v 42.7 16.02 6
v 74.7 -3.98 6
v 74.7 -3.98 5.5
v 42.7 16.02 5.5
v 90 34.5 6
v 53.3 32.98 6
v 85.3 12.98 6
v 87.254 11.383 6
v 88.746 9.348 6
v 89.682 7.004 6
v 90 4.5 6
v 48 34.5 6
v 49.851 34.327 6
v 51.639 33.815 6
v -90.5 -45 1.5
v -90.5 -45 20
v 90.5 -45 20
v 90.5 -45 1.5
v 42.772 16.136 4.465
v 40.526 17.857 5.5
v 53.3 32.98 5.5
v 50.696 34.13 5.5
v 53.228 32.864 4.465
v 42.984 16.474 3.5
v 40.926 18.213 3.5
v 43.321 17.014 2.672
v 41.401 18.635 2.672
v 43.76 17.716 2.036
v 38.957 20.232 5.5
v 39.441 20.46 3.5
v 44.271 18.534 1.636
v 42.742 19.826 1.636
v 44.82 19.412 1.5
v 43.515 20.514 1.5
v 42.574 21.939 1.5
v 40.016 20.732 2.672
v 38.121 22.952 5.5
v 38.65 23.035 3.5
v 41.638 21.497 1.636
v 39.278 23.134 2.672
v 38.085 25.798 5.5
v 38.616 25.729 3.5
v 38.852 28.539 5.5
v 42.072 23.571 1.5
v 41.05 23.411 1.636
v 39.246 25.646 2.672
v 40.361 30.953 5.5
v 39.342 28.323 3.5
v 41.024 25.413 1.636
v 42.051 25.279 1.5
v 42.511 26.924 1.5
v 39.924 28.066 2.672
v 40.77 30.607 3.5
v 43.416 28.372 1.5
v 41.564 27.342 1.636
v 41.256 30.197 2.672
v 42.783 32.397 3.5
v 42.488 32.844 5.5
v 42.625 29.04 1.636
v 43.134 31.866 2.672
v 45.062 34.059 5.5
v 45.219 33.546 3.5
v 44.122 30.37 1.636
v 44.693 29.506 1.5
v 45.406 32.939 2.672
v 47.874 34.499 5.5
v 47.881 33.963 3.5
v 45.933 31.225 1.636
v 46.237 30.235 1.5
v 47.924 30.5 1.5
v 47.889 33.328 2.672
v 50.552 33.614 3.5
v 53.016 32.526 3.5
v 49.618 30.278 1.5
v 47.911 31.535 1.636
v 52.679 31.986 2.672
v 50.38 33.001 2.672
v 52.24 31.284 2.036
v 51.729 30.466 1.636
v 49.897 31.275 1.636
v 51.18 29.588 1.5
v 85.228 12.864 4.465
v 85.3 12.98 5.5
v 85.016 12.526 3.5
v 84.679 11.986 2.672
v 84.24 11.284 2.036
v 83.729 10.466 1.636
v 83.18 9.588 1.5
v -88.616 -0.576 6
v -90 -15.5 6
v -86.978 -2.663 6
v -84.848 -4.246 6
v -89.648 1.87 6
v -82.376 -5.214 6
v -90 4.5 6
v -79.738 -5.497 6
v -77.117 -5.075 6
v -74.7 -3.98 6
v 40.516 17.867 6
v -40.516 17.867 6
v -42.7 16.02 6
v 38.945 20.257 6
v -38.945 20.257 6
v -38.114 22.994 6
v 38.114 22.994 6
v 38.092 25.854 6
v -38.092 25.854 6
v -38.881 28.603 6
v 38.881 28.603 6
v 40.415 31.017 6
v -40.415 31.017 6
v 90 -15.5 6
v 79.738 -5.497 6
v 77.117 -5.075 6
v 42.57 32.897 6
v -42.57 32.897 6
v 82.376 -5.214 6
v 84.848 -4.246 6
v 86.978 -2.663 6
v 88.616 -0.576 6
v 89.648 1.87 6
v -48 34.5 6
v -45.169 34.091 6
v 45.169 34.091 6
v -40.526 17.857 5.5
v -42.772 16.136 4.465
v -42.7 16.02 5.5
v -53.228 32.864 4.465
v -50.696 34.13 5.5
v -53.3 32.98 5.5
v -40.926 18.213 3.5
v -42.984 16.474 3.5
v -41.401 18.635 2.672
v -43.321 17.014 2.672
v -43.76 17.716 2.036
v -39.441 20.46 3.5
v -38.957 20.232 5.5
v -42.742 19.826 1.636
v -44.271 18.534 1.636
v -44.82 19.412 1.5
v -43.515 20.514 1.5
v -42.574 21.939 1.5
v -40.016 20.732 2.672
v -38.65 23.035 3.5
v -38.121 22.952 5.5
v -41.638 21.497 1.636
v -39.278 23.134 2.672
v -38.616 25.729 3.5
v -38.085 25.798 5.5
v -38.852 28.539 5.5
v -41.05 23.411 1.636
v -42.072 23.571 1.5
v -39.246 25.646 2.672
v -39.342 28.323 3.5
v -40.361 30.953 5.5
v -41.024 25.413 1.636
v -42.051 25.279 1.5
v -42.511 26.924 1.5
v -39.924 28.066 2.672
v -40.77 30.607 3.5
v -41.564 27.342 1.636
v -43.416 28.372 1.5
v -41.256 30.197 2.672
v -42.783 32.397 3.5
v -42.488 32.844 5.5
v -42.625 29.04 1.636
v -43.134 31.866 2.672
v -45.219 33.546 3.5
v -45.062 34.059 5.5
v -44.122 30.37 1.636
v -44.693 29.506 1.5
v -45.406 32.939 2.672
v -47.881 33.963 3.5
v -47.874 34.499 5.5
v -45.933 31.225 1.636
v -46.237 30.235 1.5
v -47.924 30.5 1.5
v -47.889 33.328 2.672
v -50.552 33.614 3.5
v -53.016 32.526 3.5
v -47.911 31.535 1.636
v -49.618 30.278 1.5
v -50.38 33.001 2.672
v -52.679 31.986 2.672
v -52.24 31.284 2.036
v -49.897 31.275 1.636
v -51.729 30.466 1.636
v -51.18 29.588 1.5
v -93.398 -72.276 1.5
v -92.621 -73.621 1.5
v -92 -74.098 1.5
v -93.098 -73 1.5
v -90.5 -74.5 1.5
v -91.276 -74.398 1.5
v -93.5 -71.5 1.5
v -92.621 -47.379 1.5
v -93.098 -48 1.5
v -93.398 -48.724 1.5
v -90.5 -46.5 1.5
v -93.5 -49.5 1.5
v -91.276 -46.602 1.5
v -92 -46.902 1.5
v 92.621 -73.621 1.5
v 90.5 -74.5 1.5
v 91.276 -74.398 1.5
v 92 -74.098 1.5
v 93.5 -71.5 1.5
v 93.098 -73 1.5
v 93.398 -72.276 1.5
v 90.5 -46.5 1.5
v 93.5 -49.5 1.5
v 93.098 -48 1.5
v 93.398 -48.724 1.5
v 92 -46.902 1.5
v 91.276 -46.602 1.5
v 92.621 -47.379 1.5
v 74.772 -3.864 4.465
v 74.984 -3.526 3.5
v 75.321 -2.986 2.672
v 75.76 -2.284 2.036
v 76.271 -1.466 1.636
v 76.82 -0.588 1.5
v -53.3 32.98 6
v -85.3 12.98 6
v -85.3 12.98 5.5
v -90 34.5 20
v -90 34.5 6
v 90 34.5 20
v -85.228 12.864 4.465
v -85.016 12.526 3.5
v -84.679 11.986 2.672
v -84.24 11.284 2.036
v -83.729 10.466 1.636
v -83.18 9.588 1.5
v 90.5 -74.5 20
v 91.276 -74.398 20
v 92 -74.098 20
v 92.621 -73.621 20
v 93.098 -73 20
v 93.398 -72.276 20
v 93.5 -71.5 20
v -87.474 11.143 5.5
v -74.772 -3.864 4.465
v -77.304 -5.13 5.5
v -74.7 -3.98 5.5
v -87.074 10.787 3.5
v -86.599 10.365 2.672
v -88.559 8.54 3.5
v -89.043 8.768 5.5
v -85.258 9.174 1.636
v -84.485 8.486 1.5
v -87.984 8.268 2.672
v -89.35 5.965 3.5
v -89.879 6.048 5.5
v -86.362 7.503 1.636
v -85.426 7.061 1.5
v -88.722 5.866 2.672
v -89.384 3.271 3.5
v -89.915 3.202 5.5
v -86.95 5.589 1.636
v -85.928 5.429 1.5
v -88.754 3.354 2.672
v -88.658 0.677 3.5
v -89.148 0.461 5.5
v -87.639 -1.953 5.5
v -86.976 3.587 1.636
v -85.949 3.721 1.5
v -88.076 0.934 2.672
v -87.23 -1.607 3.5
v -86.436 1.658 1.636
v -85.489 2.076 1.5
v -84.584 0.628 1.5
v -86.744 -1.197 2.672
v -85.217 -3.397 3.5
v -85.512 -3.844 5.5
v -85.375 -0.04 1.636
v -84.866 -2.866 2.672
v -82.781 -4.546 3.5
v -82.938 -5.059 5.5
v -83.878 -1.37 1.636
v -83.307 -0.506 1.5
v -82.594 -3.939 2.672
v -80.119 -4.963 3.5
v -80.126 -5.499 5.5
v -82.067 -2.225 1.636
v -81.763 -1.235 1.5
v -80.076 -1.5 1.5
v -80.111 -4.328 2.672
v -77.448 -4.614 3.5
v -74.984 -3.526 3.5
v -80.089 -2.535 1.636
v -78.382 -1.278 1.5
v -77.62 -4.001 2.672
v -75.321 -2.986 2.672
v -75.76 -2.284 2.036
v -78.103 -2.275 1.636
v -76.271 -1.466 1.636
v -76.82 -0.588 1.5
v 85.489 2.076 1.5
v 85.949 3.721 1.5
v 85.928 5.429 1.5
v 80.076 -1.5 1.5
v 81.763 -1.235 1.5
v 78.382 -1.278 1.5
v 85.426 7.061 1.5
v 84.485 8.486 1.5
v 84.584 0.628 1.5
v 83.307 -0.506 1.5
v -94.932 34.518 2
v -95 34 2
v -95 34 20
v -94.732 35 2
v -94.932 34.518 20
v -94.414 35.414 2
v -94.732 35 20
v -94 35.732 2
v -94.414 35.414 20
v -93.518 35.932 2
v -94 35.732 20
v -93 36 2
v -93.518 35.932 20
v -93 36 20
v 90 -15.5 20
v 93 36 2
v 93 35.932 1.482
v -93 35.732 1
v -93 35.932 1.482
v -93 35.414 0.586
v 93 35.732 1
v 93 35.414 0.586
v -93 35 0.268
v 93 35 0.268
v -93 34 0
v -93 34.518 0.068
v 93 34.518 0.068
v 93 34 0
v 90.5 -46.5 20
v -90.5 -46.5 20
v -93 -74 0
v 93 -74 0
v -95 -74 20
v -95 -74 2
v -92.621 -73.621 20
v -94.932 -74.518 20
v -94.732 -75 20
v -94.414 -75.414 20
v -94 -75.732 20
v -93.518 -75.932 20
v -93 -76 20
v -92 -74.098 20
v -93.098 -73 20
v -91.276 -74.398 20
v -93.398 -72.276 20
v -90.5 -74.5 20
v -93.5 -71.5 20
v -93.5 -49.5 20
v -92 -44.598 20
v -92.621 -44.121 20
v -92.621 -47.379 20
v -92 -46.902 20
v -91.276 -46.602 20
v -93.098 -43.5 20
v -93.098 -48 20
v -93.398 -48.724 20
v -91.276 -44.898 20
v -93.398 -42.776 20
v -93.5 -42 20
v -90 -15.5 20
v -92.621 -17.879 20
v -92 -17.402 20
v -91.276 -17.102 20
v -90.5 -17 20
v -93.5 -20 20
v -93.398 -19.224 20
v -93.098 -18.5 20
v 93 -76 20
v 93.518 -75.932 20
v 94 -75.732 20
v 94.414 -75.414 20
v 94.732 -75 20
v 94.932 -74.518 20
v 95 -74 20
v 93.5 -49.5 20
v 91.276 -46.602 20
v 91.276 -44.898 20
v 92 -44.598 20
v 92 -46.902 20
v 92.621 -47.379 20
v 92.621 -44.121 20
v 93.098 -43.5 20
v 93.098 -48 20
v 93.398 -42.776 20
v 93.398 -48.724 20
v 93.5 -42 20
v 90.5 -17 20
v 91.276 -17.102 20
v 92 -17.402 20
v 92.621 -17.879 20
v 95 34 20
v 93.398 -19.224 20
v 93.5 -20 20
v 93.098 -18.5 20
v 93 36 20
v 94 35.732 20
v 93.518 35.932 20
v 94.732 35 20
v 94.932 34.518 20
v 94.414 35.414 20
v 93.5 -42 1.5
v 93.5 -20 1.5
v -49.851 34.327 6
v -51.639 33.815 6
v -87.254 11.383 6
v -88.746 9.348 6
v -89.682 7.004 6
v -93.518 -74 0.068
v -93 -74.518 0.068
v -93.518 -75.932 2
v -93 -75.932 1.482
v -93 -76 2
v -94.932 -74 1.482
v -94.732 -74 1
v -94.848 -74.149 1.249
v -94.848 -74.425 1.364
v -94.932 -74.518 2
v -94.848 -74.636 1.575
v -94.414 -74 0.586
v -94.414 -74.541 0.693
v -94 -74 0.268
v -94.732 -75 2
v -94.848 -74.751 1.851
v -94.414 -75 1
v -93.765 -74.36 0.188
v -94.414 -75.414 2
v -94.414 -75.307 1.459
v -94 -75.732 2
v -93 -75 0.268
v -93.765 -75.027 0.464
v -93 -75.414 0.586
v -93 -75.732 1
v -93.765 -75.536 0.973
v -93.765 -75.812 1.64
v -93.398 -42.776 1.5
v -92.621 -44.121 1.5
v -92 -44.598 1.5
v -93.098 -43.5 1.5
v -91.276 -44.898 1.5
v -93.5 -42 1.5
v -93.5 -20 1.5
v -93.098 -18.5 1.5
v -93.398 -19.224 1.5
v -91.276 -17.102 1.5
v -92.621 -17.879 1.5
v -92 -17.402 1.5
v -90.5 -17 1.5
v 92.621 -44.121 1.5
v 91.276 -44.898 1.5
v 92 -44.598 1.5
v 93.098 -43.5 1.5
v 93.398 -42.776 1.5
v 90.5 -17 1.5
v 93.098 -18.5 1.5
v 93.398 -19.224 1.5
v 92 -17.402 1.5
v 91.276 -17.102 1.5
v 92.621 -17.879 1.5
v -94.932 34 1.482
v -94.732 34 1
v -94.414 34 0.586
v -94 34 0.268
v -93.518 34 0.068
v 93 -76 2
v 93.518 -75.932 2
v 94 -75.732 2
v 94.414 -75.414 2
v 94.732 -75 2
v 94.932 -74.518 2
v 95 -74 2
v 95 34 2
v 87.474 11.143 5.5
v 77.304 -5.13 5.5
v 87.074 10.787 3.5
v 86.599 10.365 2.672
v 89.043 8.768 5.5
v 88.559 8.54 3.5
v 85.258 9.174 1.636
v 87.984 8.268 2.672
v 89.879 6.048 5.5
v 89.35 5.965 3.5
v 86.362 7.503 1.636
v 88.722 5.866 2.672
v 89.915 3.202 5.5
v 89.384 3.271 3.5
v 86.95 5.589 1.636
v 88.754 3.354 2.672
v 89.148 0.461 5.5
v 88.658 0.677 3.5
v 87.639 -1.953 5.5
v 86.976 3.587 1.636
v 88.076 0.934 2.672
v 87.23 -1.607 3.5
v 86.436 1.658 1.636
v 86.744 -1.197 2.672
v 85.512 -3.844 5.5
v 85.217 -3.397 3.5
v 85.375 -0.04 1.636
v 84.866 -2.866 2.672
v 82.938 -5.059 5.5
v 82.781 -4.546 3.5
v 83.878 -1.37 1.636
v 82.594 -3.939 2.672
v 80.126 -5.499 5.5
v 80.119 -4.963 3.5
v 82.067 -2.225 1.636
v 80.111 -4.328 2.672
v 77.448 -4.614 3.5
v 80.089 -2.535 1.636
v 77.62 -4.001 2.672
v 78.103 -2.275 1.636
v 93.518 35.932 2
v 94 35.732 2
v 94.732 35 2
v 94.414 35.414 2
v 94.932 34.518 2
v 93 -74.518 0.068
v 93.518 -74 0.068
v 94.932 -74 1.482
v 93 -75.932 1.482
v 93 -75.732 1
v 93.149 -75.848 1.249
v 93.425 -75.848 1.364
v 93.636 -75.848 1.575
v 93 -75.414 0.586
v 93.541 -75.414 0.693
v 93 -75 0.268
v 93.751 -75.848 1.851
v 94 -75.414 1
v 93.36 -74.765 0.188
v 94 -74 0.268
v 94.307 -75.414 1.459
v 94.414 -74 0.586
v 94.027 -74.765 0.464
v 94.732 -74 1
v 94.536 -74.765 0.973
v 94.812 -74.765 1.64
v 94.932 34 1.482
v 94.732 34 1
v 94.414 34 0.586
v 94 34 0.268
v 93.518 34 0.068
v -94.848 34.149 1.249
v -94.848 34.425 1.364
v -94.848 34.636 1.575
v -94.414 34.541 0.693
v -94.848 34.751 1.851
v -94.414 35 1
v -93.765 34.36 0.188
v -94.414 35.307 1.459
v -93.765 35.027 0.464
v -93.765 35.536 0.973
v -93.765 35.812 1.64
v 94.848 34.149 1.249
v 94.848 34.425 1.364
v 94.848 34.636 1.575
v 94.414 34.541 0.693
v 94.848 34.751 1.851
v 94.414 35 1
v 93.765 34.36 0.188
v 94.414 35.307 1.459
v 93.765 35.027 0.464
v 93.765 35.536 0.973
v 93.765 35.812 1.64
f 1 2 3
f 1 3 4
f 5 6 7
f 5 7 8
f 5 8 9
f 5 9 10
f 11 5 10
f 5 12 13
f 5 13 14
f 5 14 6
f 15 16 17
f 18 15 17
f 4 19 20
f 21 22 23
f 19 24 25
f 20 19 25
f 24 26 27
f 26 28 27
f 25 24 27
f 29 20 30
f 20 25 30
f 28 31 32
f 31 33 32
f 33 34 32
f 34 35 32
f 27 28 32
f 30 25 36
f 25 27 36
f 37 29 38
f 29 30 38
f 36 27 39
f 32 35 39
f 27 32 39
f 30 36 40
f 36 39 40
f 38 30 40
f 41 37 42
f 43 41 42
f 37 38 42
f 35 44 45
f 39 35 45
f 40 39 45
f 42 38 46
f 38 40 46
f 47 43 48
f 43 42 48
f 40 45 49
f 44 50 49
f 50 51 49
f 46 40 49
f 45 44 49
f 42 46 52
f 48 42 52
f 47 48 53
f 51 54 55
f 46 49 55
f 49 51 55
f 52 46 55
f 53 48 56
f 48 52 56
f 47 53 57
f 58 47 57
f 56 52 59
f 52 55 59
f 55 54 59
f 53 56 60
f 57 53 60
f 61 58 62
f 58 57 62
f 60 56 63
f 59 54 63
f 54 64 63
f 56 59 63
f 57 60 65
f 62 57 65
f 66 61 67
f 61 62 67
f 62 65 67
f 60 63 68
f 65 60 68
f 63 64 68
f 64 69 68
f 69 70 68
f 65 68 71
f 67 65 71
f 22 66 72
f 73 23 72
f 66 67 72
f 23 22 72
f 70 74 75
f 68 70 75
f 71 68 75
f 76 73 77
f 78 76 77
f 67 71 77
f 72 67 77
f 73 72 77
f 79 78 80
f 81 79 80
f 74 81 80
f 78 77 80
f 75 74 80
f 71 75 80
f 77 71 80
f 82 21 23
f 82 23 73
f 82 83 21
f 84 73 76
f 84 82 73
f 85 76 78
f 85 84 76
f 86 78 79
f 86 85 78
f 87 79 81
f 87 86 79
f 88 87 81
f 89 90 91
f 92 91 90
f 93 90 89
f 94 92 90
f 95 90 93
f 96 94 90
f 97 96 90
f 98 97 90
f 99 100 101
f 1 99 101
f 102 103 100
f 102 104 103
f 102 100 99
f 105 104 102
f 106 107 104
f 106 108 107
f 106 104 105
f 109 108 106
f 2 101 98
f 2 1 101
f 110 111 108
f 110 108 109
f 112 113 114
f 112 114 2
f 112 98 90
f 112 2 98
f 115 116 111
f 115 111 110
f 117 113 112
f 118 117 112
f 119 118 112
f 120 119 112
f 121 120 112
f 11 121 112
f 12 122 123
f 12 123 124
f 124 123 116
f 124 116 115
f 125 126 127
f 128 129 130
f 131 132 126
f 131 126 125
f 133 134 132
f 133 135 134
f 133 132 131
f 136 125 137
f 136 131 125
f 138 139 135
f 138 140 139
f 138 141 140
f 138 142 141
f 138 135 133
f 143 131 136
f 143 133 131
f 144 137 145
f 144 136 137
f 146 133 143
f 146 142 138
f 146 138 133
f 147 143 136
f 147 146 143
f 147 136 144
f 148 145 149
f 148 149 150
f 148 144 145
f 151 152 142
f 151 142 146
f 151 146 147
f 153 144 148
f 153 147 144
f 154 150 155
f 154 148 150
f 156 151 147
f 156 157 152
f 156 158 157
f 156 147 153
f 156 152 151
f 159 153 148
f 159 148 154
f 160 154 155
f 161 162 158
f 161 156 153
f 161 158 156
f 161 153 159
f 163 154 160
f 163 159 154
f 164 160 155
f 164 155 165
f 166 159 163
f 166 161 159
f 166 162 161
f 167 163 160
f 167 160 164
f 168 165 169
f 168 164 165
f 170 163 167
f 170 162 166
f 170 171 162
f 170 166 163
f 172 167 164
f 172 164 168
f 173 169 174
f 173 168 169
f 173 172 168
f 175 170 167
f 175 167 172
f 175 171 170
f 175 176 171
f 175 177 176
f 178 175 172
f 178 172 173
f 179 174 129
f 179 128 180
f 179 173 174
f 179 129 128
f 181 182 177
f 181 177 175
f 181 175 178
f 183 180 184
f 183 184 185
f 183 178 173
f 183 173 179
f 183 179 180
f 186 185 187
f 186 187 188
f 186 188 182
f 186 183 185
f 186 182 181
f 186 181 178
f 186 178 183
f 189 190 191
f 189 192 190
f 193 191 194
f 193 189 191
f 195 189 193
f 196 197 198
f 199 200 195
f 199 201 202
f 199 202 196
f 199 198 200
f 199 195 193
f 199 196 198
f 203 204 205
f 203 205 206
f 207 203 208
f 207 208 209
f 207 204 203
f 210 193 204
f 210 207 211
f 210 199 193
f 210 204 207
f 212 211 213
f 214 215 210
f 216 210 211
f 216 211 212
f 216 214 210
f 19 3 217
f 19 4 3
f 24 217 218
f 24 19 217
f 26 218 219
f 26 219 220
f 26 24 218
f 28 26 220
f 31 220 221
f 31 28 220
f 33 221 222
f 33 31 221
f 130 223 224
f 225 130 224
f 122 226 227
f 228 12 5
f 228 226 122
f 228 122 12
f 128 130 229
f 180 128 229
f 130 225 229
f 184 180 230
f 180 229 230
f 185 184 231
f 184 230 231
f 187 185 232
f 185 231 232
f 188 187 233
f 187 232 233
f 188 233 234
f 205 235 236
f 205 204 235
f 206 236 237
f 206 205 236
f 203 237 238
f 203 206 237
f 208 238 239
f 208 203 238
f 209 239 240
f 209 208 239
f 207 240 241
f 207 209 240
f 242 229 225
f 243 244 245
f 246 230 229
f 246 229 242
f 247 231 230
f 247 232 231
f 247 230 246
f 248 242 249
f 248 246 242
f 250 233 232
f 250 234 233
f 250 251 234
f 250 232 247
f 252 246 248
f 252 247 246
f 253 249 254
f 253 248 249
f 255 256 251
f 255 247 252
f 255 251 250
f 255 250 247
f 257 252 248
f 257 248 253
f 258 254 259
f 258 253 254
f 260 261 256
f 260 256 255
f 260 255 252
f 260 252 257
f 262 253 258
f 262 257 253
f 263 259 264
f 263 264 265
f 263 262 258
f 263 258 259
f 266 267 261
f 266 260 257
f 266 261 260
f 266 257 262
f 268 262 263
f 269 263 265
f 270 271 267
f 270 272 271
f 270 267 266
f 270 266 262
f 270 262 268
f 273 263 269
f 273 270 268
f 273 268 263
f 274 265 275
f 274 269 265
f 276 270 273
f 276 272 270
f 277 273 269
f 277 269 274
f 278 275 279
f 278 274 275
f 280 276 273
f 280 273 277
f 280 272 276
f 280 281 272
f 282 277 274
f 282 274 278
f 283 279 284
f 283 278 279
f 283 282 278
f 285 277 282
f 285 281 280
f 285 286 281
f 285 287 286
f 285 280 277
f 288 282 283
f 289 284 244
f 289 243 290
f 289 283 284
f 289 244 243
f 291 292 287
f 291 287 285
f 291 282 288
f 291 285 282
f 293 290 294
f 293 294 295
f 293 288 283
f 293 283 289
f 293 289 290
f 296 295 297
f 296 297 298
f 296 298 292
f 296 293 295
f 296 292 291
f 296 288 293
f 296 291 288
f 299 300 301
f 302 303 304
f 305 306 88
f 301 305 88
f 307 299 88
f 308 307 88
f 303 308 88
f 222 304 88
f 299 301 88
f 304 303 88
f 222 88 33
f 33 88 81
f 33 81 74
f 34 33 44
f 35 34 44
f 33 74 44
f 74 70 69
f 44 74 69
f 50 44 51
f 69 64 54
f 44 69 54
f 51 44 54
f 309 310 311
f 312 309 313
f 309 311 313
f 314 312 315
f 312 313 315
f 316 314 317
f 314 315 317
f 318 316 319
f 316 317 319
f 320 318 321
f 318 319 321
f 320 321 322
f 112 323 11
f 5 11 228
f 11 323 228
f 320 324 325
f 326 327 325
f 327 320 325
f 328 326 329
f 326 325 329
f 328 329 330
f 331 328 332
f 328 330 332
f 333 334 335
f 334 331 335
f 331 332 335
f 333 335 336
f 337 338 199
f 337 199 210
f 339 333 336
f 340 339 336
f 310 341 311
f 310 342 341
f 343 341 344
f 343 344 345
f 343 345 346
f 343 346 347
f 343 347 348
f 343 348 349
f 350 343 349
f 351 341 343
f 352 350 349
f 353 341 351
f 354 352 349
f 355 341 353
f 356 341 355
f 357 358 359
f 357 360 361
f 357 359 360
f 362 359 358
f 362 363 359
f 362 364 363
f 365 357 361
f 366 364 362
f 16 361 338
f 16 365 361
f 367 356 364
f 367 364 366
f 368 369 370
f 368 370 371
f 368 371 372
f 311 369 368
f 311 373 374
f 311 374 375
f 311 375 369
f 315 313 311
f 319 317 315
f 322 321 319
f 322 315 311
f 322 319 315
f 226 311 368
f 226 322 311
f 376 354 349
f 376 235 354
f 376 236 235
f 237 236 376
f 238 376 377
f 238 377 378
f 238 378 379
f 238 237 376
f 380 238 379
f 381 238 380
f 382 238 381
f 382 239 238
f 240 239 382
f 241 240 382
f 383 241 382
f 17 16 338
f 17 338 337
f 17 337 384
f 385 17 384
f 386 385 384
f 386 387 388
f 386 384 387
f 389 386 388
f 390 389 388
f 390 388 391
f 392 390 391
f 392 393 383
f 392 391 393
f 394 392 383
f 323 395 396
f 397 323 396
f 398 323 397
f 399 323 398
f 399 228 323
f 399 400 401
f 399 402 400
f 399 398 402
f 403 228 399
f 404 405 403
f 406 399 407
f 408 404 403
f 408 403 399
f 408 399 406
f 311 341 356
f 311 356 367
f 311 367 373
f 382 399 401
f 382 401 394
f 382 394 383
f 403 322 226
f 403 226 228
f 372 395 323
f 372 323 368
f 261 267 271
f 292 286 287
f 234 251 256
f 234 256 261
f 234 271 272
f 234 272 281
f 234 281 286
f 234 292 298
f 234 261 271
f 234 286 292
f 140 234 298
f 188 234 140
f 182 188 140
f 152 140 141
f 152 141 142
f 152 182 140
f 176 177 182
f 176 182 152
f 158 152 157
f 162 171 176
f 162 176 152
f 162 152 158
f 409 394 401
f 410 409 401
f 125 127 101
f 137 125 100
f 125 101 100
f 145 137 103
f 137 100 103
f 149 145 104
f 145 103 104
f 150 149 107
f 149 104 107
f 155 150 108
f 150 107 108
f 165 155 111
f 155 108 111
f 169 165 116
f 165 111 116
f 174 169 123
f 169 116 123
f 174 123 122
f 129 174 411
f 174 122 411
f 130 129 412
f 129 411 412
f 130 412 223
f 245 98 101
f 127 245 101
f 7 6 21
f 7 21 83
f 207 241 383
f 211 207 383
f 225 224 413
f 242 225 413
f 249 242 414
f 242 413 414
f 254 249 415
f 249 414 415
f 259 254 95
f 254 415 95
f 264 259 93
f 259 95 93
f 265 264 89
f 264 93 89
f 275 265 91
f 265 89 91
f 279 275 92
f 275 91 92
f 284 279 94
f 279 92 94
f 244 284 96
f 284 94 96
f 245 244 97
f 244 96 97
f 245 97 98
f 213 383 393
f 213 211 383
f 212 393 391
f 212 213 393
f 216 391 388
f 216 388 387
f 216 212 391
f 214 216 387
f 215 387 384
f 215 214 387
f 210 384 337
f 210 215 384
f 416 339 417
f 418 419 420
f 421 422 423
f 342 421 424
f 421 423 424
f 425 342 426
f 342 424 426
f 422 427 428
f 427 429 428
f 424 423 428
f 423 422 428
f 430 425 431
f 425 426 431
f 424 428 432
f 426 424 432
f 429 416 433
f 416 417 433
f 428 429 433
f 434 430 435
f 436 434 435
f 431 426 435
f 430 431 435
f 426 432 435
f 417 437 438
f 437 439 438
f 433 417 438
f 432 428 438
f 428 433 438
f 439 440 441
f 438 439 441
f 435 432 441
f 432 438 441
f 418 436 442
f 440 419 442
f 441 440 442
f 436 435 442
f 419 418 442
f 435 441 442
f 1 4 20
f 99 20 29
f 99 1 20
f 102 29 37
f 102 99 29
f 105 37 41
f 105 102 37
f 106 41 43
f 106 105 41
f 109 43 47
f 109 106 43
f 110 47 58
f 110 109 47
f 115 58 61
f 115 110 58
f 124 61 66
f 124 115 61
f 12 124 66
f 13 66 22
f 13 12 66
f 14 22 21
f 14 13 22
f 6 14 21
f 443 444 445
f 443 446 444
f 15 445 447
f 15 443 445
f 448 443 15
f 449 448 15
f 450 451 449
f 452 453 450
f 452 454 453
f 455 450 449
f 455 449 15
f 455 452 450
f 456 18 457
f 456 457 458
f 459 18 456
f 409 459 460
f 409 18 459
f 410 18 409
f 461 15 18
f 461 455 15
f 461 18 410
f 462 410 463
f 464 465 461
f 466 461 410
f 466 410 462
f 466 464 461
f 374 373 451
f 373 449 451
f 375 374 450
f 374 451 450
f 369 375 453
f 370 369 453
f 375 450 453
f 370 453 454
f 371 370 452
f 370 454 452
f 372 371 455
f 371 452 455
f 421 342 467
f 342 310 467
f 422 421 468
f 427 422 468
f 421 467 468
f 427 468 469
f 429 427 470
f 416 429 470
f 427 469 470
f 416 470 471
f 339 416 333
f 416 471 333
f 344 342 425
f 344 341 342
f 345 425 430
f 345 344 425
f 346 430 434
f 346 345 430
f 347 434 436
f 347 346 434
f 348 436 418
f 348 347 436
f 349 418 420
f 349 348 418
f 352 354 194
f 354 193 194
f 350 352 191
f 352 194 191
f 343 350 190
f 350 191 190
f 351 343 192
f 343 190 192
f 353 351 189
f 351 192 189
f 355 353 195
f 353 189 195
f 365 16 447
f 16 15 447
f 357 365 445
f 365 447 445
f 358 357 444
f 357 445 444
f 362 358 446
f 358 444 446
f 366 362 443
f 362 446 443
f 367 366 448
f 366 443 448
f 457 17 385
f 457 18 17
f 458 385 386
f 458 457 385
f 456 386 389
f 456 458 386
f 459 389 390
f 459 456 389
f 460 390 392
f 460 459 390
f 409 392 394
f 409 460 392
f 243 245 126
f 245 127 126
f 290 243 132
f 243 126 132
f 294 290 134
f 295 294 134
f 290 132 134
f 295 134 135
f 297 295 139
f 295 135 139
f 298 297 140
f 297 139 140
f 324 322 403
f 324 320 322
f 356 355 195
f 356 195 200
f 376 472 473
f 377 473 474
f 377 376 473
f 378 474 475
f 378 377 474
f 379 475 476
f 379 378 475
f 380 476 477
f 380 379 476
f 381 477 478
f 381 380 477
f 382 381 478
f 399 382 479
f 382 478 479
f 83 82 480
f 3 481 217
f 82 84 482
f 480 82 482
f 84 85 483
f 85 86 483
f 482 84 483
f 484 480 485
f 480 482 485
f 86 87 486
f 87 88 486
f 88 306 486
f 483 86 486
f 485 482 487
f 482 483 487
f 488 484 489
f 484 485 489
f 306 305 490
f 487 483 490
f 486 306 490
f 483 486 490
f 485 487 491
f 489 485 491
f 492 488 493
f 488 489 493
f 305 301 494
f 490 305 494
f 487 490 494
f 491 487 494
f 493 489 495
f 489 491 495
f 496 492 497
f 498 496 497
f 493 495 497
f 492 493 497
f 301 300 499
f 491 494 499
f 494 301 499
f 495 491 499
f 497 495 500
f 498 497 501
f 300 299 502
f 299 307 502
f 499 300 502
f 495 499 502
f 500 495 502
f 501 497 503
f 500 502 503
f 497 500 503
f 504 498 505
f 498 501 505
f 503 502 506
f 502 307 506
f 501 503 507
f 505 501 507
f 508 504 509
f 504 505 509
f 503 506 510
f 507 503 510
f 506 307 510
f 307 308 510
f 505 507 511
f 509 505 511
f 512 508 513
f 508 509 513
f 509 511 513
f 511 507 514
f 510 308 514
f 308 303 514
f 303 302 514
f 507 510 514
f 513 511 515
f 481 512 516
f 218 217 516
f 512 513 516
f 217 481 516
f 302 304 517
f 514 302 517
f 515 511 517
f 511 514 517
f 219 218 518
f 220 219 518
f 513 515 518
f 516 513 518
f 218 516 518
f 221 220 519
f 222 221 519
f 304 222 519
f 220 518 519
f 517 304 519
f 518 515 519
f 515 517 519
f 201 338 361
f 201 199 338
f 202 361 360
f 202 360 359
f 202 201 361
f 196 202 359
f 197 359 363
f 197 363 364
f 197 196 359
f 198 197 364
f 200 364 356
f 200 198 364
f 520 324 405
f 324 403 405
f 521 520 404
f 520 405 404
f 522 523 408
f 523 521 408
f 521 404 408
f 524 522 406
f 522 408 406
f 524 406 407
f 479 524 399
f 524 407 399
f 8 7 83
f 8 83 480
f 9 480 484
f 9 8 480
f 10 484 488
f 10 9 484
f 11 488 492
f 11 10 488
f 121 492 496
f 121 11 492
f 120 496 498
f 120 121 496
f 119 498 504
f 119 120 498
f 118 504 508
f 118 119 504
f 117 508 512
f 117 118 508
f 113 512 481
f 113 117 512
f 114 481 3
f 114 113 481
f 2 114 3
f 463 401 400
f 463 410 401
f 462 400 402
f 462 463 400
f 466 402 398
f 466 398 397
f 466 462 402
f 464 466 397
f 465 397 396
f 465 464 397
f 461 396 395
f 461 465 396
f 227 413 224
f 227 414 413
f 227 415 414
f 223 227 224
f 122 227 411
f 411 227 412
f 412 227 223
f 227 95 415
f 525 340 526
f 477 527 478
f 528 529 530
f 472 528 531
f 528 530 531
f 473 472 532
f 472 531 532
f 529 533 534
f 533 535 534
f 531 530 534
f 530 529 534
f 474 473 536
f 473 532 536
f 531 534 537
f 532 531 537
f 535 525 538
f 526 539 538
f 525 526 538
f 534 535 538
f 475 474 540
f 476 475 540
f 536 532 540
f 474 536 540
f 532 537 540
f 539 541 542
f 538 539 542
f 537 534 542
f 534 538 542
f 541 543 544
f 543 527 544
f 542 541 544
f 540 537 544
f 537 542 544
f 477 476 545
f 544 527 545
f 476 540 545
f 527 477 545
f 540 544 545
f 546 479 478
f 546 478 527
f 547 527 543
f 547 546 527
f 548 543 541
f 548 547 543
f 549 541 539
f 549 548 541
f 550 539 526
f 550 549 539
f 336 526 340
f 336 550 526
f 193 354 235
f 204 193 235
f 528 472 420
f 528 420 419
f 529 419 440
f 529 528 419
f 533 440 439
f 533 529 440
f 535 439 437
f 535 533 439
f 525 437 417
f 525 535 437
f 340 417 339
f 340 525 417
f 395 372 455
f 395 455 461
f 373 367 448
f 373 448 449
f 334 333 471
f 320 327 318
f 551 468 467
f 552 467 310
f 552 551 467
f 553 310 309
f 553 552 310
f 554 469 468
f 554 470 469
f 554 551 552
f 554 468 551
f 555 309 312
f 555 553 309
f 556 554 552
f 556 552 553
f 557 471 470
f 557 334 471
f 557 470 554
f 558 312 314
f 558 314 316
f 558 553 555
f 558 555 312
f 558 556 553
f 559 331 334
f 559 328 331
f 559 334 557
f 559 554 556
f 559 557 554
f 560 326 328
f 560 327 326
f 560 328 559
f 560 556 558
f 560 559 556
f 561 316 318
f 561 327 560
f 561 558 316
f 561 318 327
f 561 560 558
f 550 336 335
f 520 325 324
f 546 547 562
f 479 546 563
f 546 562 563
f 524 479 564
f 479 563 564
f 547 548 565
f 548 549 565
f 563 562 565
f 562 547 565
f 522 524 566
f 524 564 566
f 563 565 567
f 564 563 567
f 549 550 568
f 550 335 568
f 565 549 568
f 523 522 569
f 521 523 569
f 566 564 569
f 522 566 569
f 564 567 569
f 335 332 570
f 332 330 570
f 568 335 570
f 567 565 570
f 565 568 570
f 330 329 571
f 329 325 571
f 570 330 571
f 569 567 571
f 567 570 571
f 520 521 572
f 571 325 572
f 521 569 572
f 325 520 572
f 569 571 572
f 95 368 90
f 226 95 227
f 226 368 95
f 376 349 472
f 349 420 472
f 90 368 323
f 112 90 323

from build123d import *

# Parameters (mm, degrees)
SKETCH013_W            = 190
SKETCH013_H            = 112
PAD009_DEPTH           = 20
SKETCH014_W            = 180
SKETCH014_H            = 50
POCKET004_DEPTH        = 14
SKETCH015_W            = 187
SKETCH015_H            = 28
POCKET005_DEPTH        = 18.5
LINEARPATTERN007_COUNT = 2
LINEARPATTERN007_PITCH = 29.5
FILLET013_R            = 3
POCKET006_DEPTH        = 4.5
FILLET014_R            = 4
FILLET016_R            = 2


with BuildPart() as part:
    # Sketch013 → Pad009 (new body)
    with BuildSketch(Plane.XY):
        Rectangle(SKETCH013_W, SKETCH013_H)
    extrude(amount=PAD009_DEPTH)

    # Sketch014 (on DatumPlane) → Pocket004 (cut)
    with BuildSketch(Plane(origin=(0, 4.5, 20), x_dir=(1, 0, 0), z_dir=(0, 0, 1))):
        with Locations((0, 25)):
            Rectangle(SKETCH014_W, SKETCH014_H)
    extrude(amount=-POCKET004_DEPTH, mode=Mode.SUBTRACT)

    # Sketch015 (on DatumPlane) → Pocket005 (cut)
    with BuildSketch(Plane(origin=(0, 3, 20), x_dir=(1, 0, 0), z_dir=(0, 0, 1))):
        with Locations((0, -14)):
            Rectangle(SKETCH015_W, SKETCH015_H)
    pocket005 = extrude(amount=-POCKET005_DEPTH, mode=Mode.SUBTRACT)

    # LinearPattern007: Pocket005 ×2
    with Locations(*[(0, -i * LINEARPATTERN007_PITCH, 0) for i in range(1, LINEARPATTERN007_COUNT)]):
        add(pocket005, mode=Mode.SUBTRACT)

    # Fillet013
    fillet013_edges = [part.edges().sort_by_distance(p)[0] for p in [
        (93.5, 3, 10.75),
        (93.5, -26.5, 10.75),
        (-93.5, 3, 10.75),
        (-93.5, -26.5, 10.75),
        (-93.5, -25, 10.75),
        (-93.5, -54.5, 10.75),
        (93.5, -25, 10.75),
        (93.5, -54.5, 10.75),
    ]]
    fillet(fillet013_edges, radius=FILLET013_R)

    # Sketch016 (on DatumPlane) → Pocket006 (cut)
    with BuildSketch(Plane(origin=(0, 4.5, 6), x_dir=(1, 0, 0), z_dir=(0, 0, 1))):
        with BuildLine():
            ThreePointArc((-85.299989, 28.479983), (-88.479983, 14.700011), (-74.700011, 11.520017))
            Line((-74.700011, 11.520017), (-42.700011, 31.520017))
            ThreePointArc((-42.700011, 31.520017), (-39.520017, 45.299989), (-53.299989, 48.479983))
            Line((-53.299989, 48.479983), (-85.299989, 28.479983))
        make_face()
    pocket006 = extrude(amount=-POCKET006_DEPTH, mode=Mode.SUBTRACT)

    # Mirrored002: Pocket006 across Sketch016 V_Axis
    add(pocket006.mirror(Plane(origin=(0, 4.5, 6), x_dir=(0, 0, 1), z_dir=(1, 0, 0))), mode=Mode.SUBTRACT)

    # Fillet014
    fillet014_edges = [part.edges().sort_by_distance(p)[0] for p in [
        (88.479983, 19.200011, 1.5),
        (58.700011, 26.020017, 1.5),
        (39.520017, 49.799989, 1.5),
        (69.299989, 42.979983, 1.5),
        (-88.479983, 19.200011, 1.5),
        (-58.700011, 26.020017, 1.5),
        (-39.520017, 49.799989, 1.5),
        (-69.299989, 42.979983, 1.5),
    ]]
    fillet(fillet014_edges, radius=FILLET014_R)

    # Fillet016
    fillet016_edges = [part.edges().sort_by_distance(p)[0] for p in [
        (0, 56, 0),
        (95, 0, 0),
        (0, -56, 0),
        (-95, 0, 0),
        (-95, -56, 10),
        (-95, 56, 10),
        (95, 56, 10),
        (95, -56, 10),
    ]]
    fillet(fillet016_edges, radius=FILLET016_R)


with BuildPart() as part_1:
    # Body004 placement: moved
    add(part.part.moved(Location((0, -20, 0))))


solid = part_1.part
